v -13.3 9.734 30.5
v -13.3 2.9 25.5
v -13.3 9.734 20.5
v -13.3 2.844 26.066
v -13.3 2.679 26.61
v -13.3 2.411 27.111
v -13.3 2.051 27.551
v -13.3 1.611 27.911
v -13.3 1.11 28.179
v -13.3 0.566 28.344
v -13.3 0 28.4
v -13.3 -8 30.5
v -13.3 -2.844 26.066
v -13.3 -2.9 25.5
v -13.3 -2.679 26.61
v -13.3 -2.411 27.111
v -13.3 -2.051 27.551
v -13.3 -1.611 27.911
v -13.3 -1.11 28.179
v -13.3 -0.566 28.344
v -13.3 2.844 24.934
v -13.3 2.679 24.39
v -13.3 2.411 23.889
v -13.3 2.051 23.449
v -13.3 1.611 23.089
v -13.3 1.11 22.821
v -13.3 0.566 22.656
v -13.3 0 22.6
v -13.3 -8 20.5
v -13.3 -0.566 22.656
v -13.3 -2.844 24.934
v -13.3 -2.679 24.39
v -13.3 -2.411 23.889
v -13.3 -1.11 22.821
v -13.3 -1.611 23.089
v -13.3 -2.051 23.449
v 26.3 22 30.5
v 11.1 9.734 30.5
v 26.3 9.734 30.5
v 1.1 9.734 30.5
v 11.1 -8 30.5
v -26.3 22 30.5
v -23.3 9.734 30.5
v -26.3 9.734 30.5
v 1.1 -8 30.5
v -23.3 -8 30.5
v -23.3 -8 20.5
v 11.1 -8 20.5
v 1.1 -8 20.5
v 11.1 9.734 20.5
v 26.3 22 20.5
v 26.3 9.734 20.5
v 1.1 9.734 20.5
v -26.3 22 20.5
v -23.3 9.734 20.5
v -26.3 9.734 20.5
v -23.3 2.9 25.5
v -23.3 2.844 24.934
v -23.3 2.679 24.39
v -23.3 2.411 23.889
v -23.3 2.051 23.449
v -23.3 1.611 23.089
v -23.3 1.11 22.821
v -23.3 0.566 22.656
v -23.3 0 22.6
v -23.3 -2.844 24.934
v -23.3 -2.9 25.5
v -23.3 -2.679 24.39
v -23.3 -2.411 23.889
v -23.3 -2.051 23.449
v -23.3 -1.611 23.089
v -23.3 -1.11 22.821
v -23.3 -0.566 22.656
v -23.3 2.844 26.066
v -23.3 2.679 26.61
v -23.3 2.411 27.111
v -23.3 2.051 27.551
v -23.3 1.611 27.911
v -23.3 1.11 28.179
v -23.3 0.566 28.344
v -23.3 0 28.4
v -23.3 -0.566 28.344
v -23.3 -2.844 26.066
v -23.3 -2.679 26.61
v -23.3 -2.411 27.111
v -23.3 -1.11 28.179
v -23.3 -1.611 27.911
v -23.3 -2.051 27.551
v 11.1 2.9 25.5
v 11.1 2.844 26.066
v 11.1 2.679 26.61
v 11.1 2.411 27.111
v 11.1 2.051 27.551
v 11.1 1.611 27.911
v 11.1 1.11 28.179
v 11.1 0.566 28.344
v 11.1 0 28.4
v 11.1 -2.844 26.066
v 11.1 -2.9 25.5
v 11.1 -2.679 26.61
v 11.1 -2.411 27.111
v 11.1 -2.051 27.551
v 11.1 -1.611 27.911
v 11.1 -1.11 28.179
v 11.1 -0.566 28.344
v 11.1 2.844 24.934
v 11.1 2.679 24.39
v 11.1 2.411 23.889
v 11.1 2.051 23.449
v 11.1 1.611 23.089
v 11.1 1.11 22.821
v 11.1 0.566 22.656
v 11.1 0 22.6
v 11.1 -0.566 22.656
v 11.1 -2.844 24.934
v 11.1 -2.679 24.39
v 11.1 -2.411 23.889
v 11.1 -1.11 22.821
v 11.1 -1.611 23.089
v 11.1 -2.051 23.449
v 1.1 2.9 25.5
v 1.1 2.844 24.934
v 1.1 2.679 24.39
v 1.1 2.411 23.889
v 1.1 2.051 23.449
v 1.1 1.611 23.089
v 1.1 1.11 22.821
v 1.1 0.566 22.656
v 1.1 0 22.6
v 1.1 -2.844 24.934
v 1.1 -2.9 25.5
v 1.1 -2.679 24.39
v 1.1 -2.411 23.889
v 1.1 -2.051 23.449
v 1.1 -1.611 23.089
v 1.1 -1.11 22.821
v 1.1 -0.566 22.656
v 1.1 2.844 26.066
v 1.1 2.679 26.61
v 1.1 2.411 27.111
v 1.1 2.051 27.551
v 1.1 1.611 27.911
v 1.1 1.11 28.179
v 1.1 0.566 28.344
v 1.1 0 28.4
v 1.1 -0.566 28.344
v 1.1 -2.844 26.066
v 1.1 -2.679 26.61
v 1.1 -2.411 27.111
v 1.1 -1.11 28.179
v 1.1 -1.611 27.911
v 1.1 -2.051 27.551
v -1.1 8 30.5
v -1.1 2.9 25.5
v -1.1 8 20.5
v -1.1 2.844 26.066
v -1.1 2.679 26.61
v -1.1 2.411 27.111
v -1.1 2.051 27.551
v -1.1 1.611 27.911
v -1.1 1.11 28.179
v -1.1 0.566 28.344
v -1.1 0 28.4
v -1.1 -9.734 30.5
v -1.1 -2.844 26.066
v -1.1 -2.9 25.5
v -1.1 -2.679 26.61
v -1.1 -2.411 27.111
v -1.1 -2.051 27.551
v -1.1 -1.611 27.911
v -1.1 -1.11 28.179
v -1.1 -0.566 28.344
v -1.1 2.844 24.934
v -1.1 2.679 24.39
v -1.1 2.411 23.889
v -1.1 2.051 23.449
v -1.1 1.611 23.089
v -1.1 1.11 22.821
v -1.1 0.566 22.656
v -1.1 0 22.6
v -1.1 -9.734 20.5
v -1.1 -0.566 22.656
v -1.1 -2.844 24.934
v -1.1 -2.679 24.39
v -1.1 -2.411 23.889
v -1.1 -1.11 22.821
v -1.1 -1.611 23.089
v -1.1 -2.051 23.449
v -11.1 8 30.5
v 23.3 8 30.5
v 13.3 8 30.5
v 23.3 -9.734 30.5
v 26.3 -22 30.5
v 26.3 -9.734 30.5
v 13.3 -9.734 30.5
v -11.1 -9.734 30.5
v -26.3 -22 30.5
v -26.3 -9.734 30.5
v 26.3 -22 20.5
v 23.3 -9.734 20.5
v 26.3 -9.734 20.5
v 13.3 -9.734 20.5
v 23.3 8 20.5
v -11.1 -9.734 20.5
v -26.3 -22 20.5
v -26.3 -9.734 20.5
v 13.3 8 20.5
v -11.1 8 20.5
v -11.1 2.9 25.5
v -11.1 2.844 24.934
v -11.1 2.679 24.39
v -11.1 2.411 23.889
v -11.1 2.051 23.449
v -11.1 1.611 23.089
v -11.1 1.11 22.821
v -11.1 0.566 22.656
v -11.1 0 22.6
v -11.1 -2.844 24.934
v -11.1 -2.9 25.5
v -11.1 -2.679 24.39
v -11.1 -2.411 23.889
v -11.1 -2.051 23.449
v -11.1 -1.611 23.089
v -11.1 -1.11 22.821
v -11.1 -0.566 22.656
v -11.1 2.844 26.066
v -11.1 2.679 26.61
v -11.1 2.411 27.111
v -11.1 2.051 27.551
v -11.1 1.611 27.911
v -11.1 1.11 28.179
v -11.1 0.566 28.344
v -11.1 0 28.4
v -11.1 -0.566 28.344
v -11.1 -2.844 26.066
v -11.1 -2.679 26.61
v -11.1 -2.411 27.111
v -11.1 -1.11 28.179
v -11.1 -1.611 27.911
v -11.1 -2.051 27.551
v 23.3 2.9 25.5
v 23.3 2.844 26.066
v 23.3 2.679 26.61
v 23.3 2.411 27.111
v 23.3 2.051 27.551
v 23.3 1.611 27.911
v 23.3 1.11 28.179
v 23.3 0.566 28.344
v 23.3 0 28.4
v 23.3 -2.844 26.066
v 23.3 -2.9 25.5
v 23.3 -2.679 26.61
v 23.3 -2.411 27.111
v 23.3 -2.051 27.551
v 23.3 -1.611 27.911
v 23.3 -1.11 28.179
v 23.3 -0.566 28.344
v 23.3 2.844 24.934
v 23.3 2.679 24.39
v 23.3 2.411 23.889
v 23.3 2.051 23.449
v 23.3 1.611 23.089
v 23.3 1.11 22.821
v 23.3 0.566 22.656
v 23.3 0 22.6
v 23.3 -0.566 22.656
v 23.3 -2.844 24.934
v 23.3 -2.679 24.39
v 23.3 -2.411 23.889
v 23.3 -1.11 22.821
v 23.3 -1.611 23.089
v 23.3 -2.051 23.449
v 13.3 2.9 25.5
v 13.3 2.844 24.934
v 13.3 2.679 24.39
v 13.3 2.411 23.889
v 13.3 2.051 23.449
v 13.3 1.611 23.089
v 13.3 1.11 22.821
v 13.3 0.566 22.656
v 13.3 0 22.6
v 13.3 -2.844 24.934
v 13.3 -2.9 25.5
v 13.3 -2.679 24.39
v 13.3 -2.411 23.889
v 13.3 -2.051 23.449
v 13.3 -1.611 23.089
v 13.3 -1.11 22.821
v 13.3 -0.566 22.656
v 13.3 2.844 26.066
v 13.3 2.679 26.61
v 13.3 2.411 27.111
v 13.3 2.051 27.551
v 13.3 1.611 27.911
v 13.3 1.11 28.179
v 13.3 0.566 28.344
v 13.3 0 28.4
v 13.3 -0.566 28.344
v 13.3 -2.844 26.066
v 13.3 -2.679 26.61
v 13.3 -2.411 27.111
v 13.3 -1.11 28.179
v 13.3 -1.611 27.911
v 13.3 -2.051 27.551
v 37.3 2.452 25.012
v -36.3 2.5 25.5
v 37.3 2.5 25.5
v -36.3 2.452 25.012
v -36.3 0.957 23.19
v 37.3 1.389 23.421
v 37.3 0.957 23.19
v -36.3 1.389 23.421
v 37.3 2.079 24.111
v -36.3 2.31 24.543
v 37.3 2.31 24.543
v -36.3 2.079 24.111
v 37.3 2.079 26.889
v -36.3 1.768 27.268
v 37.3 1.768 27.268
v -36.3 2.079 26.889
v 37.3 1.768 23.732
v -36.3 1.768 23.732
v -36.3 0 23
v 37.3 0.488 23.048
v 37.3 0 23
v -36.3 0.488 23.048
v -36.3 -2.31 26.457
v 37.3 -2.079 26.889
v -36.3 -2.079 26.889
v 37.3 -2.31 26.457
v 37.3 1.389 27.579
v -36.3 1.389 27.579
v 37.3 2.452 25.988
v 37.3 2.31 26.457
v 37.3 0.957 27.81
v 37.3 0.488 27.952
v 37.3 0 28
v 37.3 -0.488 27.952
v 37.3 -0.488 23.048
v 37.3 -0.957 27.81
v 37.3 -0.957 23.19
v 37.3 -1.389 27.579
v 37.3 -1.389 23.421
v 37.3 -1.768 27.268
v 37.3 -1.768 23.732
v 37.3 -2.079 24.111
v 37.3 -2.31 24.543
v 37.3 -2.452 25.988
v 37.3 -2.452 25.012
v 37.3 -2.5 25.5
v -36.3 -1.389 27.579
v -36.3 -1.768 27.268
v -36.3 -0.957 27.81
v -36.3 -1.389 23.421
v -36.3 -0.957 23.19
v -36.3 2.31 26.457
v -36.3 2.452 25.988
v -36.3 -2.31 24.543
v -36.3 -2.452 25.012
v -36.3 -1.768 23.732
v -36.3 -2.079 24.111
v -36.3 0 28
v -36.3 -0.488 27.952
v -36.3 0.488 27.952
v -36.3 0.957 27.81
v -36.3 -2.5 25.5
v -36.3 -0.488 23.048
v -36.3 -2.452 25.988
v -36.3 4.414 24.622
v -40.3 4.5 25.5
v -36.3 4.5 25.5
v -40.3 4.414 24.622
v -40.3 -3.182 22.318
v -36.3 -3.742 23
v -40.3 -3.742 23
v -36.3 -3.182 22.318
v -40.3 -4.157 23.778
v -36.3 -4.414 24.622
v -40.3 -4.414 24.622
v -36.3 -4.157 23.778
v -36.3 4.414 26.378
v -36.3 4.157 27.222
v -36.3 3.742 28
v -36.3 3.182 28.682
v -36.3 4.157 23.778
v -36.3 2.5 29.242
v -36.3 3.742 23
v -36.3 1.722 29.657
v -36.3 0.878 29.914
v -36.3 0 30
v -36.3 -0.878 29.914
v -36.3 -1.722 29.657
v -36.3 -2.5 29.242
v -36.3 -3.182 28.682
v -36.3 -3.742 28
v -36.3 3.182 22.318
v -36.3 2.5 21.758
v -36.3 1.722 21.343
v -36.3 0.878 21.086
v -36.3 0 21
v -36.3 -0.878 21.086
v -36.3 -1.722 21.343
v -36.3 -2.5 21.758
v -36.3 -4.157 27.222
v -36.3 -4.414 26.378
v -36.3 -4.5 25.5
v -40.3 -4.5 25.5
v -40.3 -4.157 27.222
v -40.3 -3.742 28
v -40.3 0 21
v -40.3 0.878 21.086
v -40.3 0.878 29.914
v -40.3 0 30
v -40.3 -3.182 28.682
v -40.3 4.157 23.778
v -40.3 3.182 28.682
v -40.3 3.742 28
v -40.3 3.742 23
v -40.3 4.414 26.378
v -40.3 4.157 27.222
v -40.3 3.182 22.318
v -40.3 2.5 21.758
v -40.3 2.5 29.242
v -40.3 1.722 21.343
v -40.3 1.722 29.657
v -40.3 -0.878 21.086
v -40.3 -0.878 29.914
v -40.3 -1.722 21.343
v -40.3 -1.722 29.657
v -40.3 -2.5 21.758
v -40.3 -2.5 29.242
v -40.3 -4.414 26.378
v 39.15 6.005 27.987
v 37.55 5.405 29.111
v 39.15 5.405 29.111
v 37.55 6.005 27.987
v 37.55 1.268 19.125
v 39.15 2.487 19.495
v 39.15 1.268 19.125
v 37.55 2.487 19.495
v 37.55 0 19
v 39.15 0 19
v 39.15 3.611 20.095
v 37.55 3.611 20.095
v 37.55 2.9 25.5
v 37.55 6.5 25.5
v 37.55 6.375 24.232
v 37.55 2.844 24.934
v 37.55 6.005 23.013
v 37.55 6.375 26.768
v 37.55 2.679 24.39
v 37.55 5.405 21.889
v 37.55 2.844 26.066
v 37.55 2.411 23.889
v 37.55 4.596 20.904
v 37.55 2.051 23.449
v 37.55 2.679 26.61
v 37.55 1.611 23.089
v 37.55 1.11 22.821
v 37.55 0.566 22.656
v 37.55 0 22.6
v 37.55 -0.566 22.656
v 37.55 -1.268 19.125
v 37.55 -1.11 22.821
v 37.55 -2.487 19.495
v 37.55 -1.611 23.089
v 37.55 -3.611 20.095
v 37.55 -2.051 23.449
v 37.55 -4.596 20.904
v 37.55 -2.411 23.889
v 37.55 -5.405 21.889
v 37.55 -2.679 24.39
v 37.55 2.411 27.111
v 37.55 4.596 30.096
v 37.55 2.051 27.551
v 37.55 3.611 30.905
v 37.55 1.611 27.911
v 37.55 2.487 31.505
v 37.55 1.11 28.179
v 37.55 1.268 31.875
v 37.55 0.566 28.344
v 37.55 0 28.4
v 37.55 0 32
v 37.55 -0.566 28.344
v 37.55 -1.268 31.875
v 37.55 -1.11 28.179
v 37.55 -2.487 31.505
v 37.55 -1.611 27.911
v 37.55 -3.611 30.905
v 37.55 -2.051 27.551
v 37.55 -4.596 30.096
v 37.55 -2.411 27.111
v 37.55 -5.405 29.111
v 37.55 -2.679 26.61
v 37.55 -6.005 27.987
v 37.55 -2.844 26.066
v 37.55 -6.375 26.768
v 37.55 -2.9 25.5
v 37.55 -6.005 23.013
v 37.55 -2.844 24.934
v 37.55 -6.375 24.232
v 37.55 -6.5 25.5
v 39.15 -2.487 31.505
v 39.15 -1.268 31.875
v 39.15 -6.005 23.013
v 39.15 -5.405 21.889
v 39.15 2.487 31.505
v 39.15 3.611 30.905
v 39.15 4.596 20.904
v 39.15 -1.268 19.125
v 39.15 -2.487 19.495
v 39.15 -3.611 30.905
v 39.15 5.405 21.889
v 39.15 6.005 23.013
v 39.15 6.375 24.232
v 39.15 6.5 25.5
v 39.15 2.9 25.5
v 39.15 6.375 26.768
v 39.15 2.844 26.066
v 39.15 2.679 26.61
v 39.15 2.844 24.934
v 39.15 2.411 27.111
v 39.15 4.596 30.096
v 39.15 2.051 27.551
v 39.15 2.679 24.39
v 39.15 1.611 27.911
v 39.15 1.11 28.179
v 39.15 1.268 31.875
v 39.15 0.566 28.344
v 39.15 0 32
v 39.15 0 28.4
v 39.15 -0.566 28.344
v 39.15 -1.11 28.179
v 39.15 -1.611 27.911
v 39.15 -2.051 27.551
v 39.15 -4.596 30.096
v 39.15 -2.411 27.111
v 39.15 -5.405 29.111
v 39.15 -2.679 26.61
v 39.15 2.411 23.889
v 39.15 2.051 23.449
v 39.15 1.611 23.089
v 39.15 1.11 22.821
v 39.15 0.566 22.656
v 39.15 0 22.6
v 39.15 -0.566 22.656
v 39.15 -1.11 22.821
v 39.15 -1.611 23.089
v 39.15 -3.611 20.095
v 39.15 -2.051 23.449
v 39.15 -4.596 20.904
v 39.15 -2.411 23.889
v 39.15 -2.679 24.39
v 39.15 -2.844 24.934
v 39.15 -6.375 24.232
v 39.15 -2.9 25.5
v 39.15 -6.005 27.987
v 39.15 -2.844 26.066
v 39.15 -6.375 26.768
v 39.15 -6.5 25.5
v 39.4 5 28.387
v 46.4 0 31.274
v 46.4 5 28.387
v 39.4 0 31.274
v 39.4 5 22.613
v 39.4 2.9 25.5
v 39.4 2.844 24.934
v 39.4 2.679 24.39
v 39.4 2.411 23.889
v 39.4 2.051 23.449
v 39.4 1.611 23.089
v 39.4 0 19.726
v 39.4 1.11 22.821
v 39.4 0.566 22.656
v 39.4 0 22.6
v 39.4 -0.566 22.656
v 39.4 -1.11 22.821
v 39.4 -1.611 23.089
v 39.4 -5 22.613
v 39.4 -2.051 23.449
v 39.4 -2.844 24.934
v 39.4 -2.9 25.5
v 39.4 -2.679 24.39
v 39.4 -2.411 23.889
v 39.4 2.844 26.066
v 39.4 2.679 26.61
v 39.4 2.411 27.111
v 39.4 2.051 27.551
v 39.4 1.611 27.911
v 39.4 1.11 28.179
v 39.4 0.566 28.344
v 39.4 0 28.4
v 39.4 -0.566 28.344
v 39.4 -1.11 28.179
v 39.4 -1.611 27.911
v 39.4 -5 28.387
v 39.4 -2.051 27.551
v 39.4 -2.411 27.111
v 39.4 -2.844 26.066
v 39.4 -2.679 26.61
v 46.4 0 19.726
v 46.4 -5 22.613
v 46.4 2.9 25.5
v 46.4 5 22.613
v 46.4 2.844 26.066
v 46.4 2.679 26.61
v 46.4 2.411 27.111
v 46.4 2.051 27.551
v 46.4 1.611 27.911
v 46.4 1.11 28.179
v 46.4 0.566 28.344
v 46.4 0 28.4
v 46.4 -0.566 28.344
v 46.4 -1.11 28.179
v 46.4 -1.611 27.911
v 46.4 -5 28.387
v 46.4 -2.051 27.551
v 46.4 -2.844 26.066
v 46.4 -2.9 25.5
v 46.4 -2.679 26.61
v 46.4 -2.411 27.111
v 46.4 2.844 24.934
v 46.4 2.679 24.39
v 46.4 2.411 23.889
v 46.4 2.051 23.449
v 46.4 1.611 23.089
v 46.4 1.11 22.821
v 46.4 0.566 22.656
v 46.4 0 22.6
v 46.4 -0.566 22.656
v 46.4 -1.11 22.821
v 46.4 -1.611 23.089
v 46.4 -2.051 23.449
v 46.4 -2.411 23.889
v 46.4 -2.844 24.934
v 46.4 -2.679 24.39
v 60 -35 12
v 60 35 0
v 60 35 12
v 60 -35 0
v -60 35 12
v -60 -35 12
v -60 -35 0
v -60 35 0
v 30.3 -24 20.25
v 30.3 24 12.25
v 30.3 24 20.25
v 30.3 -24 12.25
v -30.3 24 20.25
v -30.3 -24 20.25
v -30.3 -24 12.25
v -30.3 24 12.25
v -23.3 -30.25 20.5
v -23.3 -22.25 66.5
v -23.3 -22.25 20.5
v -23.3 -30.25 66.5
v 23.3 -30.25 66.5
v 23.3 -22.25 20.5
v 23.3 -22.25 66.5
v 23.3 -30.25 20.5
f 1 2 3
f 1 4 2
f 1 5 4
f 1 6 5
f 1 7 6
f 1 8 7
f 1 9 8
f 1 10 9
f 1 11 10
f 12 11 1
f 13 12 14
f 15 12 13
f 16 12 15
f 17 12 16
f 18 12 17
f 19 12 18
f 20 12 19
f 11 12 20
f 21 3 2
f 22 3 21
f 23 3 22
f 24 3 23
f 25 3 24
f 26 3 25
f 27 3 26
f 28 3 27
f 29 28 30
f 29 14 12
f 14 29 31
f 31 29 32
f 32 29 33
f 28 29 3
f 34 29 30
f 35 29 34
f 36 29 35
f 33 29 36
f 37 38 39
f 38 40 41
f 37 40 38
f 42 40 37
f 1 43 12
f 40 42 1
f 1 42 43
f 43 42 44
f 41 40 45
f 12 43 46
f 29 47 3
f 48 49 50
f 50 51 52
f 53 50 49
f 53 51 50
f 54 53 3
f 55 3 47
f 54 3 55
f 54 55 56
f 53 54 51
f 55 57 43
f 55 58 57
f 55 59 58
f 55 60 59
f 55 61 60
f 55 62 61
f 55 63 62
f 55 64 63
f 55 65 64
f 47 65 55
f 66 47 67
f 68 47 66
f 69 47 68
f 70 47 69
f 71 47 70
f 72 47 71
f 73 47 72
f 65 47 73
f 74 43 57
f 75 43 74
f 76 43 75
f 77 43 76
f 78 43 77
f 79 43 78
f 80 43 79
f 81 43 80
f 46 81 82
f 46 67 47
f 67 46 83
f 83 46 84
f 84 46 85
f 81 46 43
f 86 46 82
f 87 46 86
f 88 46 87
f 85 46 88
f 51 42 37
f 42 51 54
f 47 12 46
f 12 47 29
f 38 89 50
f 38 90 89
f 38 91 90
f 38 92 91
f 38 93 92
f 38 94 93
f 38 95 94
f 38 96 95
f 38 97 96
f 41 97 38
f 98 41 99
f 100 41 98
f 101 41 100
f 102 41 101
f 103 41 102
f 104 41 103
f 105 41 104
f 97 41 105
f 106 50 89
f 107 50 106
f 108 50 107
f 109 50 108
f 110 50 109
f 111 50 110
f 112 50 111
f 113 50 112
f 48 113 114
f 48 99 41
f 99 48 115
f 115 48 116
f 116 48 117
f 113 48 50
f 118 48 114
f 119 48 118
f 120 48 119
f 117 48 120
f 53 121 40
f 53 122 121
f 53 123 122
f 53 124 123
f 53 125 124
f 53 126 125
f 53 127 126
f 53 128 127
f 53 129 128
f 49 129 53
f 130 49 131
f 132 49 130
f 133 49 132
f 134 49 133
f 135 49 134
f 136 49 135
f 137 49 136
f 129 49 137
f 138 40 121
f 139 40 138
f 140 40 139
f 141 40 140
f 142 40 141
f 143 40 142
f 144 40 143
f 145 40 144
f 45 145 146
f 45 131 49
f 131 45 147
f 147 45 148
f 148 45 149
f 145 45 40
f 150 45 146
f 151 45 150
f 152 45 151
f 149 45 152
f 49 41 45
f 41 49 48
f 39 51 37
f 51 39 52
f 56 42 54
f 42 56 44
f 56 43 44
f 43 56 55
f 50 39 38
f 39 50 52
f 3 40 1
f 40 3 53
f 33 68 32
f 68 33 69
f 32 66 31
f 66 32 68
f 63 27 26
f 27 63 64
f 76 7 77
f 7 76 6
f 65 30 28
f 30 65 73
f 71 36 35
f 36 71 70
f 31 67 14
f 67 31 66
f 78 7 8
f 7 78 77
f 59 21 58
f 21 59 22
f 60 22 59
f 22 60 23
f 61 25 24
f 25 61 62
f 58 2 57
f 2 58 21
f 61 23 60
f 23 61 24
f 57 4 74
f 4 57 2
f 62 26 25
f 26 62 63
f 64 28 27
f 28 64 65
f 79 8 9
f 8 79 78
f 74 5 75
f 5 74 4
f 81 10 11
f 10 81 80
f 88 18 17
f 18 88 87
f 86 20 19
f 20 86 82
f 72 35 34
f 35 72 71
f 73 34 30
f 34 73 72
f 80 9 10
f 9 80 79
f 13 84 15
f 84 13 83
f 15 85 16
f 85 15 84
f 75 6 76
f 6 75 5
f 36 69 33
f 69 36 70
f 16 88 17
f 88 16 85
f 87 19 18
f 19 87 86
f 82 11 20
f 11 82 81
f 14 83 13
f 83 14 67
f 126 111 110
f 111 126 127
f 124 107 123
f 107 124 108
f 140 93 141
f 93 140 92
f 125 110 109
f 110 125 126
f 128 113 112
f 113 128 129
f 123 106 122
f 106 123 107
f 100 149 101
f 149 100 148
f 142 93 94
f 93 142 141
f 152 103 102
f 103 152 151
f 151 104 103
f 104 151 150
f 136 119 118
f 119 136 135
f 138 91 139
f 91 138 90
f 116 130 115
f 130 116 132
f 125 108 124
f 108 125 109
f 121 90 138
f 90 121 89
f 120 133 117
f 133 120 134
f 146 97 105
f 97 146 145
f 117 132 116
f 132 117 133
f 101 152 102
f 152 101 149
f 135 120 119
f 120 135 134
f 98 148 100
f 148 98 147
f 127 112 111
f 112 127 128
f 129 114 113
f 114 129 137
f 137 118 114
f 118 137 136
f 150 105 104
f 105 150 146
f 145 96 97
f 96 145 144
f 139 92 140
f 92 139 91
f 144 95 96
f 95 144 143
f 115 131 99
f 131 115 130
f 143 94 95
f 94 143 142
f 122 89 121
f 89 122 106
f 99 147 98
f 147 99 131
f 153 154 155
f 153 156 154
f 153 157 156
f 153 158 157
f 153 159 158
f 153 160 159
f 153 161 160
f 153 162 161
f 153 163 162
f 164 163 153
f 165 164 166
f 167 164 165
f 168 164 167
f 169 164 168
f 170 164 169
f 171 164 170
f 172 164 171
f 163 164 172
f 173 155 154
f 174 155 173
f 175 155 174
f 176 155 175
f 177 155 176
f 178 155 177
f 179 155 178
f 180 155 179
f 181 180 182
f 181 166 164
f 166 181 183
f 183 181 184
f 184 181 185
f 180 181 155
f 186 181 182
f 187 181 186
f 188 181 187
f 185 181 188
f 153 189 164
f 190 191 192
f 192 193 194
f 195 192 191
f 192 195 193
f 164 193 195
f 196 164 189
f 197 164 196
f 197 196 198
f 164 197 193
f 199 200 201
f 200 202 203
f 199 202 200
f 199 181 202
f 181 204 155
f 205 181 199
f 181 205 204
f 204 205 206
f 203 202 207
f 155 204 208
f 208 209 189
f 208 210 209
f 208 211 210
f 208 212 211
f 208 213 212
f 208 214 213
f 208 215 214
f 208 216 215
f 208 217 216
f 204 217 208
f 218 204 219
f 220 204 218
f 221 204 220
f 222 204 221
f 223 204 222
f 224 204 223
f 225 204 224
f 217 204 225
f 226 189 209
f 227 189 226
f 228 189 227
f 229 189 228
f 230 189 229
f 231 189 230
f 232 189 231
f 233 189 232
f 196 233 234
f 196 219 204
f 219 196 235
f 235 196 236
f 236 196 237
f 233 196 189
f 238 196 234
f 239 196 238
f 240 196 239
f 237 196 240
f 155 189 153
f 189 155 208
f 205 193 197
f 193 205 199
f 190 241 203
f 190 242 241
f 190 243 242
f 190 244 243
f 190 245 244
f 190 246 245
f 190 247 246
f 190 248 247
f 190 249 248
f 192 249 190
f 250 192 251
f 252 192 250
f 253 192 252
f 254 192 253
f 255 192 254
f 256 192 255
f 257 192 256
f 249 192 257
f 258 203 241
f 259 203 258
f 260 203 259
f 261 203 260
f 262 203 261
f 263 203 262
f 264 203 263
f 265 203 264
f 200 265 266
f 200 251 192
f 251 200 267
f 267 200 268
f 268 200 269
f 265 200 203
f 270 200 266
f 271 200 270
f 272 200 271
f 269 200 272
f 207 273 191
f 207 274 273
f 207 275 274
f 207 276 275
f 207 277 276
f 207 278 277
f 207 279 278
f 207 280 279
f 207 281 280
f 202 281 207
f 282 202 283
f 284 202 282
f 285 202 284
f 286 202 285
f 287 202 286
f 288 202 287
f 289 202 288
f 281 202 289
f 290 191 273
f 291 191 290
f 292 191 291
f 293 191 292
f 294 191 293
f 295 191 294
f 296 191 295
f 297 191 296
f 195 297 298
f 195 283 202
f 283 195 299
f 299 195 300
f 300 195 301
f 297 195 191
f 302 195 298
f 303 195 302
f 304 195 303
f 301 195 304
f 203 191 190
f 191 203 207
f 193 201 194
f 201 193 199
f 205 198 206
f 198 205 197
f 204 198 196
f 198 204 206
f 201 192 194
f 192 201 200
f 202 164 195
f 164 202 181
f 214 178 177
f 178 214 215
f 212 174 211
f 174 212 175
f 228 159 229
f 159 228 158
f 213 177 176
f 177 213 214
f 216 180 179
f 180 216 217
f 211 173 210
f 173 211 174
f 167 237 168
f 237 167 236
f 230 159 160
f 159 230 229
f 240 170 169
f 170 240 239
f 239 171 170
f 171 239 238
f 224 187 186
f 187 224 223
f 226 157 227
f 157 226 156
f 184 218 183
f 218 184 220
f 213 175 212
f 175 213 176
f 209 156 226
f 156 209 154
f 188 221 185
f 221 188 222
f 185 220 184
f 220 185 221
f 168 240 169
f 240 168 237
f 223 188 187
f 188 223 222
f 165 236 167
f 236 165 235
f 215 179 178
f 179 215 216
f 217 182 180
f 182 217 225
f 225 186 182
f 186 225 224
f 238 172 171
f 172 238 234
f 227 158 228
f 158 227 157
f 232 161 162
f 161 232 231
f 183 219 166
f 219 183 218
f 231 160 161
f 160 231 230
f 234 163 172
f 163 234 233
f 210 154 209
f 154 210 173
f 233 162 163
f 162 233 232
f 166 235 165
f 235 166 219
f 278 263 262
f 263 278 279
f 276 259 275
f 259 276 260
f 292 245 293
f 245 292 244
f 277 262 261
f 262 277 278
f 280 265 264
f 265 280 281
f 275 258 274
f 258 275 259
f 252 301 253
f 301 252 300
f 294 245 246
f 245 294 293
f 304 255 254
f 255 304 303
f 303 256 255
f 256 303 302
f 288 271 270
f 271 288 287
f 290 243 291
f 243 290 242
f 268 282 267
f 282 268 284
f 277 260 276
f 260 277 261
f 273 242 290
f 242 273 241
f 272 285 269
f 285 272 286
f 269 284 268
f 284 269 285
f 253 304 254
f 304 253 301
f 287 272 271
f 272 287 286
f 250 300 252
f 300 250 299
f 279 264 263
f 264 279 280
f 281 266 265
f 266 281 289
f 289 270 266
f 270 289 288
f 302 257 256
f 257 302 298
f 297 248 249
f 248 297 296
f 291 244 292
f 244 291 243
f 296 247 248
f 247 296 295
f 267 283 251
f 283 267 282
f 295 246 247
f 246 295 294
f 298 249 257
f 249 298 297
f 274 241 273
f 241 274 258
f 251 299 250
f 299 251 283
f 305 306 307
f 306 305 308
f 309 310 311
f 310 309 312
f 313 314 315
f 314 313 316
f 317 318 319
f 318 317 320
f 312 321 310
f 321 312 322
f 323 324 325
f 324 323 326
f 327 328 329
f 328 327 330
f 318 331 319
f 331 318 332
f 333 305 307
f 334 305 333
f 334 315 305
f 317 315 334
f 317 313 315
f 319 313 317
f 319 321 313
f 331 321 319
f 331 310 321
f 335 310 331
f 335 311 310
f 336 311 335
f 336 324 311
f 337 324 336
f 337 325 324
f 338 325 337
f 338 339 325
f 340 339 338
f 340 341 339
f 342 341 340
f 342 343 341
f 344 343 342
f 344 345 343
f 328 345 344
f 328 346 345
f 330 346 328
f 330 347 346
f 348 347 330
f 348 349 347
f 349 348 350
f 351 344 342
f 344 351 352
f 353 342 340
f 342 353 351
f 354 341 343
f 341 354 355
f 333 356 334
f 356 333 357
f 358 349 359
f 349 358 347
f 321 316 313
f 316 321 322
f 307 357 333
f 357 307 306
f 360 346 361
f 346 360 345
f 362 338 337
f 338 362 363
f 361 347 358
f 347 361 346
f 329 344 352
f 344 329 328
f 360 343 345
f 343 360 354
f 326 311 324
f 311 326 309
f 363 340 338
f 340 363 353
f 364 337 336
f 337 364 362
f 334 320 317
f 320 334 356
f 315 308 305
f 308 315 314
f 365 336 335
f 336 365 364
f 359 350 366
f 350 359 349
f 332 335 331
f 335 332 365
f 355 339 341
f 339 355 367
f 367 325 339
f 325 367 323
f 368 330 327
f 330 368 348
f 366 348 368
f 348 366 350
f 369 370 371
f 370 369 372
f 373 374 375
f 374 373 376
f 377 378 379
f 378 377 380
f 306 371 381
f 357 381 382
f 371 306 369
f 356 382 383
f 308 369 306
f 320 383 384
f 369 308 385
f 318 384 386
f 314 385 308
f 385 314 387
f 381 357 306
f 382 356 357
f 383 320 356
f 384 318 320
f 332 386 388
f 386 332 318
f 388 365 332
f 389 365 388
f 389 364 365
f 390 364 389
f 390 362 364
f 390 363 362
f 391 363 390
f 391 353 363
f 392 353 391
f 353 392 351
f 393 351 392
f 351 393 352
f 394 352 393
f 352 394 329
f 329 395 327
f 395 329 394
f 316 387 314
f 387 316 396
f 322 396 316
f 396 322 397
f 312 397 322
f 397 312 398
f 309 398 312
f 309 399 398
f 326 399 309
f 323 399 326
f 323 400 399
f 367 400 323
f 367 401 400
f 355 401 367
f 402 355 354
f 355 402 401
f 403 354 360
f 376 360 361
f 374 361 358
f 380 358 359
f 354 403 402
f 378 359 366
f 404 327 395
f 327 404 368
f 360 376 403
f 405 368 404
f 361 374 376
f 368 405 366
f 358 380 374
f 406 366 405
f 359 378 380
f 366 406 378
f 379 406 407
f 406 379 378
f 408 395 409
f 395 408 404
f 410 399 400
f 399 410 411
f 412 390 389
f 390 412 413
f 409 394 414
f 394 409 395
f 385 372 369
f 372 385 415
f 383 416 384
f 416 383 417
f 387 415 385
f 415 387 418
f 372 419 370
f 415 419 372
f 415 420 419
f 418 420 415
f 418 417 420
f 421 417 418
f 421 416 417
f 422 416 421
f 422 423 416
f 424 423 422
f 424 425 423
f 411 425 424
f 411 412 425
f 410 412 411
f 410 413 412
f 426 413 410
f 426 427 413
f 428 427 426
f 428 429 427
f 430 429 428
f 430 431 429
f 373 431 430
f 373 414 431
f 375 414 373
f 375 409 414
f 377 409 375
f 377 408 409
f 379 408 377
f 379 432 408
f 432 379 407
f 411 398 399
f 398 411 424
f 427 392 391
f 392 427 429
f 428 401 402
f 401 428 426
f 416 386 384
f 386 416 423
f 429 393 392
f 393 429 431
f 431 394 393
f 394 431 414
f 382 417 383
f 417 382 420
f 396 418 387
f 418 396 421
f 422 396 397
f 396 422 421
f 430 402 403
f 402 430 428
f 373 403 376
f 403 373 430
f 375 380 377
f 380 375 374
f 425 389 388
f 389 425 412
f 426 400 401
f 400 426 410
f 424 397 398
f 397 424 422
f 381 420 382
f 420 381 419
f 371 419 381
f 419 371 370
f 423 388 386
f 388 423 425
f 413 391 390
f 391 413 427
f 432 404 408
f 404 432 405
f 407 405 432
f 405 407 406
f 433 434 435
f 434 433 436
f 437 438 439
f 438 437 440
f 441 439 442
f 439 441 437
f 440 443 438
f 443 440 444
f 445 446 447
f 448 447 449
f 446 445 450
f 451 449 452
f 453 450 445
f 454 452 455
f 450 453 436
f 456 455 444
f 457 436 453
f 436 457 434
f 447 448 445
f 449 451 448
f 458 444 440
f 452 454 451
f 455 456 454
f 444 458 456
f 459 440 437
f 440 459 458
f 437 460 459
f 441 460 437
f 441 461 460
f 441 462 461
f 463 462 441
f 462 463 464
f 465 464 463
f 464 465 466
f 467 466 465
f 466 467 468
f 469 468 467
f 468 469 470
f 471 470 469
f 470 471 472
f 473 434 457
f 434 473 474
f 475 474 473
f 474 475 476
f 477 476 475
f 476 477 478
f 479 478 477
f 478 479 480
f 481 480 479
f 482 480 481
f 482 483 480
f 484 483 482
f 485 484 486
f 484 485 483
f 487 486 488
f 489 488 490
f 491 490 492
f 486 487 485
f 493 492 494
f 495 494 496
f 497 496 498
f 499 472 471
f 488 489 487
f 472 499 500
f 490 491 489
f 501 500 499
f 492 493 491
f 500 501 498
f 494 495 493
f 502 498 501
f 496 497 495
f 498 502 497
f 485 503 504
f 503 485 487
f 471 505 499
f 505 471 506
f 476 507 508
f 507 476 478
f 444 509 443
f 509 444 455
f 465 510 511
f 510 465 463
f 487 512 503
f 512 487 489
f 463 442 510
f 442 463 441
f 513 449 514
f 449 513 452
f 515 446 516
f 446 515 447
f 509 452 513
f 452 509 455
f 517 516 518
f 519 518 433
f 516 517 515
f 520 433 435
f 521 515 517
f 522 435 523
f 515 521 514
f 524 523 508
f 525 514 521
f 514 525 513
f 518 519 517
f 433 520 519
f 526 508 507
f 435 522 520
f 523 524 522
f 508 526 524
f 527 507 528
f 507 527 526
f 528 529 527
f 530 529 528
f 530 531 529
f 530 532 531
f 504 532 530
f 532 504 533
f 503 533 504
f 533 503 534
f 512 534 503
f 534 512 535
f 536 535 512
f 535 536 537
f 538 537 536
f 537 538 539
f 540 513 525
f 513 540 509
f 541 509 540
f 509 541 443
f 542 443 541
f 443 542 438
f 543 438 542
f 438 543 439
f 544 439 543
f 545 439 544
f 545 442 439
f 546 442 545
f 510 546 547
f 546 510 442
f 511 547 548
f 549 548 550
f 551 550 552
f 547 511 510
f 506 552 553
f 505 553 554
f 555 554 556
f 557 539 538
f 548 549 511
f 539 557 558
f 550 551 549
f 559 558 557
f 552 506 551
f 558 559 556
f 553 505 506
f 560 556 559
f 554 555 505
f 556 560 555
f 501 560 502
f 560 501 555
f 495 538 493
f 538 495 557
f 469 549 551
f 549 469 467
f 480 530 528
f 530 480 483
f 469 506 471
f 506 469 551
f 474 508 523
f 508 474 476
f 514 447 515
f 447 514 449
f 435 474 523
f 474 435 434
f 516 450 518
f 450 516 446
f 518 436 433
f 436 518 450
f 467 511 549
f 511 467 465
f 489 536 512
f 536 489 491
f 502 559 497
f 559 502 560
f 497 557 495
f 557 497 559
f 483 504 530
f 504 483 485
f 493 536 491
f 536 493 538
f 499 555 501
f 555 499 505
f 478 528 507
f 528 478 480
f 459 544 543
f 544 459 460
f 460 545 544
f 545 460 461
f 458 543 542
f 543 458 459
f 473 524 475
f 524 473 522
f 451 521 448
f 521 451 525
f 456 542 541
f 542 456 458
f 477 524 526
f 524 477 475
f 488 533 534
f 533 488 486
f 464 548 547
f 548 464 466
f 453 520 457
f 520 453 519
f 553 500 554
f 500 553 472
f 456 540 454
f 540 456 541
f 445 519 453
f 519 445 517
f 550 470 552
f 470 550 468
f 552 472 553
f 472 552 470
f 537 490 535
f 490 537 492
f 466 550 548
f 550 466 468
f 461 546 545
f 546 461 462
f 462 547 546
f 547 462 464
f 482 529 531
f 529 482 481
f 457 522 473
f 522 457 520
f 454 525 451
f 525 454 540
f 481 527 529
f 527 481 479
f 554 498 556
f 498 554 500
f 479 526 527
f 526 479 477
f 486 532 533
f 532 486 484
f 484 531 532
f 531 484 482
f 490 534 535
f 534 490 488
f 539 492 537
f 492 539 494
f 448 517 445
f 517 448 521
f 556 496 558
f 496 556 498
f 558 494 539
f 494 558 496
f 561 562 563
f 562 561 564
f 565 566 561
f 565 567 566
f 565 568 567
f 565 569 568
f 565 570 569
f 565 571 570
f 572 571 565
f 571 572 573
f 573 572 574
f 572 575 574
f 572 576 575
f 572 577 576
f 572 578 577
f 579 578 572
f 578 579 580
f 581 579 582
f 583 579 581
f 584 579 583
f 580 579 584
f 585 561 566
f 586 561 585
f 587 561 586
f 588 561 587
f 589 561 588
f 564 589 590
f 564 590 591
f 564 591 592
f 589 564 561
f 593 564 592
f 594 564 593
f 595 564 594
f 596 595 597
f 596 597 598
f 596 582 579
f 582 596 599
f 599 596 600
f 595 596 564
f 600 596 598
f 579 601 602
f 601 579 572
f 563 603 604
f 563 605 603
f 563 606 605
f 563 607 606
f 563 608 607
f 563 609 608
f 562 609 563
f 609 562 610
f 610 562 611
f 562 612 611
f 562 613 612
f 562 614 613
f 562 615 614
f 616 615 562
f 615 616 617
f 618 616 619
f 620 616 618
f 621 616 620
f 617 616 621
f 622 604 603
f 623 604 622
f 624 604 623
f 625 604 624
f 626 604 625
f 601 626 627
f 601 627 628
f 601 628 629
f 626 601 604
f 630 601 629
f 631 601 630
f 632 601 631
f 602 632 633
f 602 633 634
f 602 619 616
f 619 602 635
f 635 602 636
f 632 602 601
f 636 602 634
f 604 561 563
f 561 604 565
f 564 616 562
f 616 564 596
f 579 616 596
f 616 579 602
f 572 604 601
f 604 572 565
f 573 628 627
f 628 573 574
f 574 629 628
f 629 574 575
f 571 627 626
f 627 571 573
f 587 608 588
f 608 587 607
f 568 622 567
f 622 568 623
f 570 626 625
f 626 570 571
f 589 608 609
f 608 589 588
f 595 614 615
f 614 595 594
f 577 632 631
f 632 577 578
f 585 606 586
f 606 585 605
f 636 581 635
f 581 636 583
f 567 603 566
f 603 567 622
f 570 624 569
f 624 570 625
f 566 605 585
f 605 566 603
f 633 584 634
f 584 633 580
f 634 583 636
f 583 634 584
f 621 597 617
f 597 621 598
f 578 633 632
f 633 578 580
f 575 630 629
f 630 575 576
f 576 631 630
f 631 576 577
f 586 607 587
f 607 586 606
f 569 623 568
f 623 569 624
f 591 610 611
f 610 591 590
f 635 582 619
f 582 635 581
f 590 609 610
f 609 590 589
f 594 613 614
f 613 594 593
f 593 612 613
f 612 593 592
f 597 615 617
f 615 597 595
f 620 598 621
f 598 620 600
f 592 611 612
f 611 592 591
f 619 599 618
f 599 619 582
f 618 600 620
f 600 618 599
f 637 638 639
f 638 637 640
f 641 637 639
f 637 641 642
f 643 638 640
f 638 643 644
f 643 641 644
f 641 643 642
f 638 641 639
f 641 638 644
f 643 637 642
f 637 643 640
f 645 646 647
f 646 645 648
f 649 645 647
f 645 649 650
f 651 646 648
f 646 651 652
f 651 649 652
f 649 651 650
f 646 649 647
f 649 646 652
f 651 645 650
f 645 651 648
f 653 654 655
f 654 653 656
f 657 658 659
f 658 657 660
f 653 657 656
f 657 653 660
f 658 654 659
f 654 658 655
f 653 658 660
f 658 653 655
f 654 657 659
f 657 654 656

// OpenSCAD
$fn = 32;

// ------------------------------------------------------------------------
// Comb hinge with flap: leaf 52.6 x 22 mm, pin d5, flap 46 mm
// Every part is its own module, assembly() places every instance.
// ------------------------------------------------------------------------

// --- part 1 ---
module hinge_bed() {
  difference() {
    translate([-60, -35, 0]) cube([120, 70, 12]);
  }
}

// --- part 2 ---
module hinge_riser() {
  difference() {
    translate([-30.3, -24, 0]) cube([60.6, 48, 8]);
  }
}

// --- part 3 ---
module hinge_leaf_a() {
  difference() {
    union() {
      translate([-23.3, -8, -5]) cube([10, 30, 10]);
      translate([1.1, -8, -5]) cube([10, 30, 10]);
      translate([-26.3, 9.734, -5]) cube([52.6, 12.266, 10]);
    }
    translate([-18.3, 0, 0]) rotate([0, 90, 0]) cylinder(h = 12, d = 5.8, center = true);
    translate([6.1, 0, 0]) rotate([0, 90, 0]) cylinder(h = 12, d = 5.8, center = true);
  }
}

// --- part 4 ---
module hinge_leaf_b() {
  difference() {
    union() {
      translate([-11.1, -22, -5]) cube([10, 30, 10]);
      translate([13.3, -22, -5]) cube([10, 30, 10]);
      translate([-26.3, -22, -5]) cube([52.6, 12.266, 10]);
    }
    translate([-6.1, 0, 0]) rotate([0, 90, 0]) cylinder(h = 12, d = 5.8, center = true);
    translate([18.3, 0, 0]) rotate([0, 90, 0]) cylinder(h = 12, d = 5.8, center = true);
  }
}

// --- part 5 ---
module hinge_flap() {
  difference() {
    translate([-23.3, -23, 0]) cube([46.6, 46, 8]);
  }
}

// --- part 6 ---
module hinge_pin() {
  rotate([0, 90, 0]) cylinder(h = 74.6, d = 5, center = true);
  translate([-40.3, 0, 0]) rotate([0, 90, 0]) cylinder(h = 4, d = 9);
}

// --- part 7 ---
module pin_washer() {
  difference() {
      translate([0, 0, 0]) cylinder(h = 1.6, d = 13);
      translate([0, 0, -1]) cylinder(h = 3.6, d = 5.8);
    }
}

// --- part 8 ---
module pin_nut() {
  difference() {
    linear_extrude(height = 7) polygon(points = [[5.774, 0], [2.887, 5], [-2.887, 5], [-5.774, 0], [-2.887, -5], [2.887, -5]]);
    translate([0, 0, -1]) cylinder(h = 9, d = 5.8);
  }
}

// --- assembly ---
module assembly() {
  color([0.80, 0.24, 0.20]) translate([0, 0, 0]) rotate([0, 0, 0]) hinge_bed();
  color([0.20, 0.45, 0.75]) translate([0, 0, 12.25]) rotate([0, 0, 0]) hinge_riser();
  color([0.25, 0.62, 0.32]) translate([0, 0, 25.5]) rotate([0, 0, 0]) hinge_leaf_a();
  color([0.92, 0.70, 0.18]) translate([0, 0, 25.5]) rotate([0, 0, 0]) hinge_leaf_b();
  color([0.58, 0.35, 0.70]) translate([0, -22.25, 43.5]) rotate([90, 0, 0]) hinge_flap();
  color([0.16, 0.66, 0.66]) translate([0, 0, 25.5]) rotate([0, 0, 0]) hinge_pin();
  color([0.85, 0.48, 0.18]) translate([37.55, 0, 25.5]) rotate([0, 90, 0]) pin_washer();
  color([0.55, 0.60, 0.65]) translate([39.4, 0, 25.5]) rotate([0, 90, 0]) pin_nut();
}

assembly();
